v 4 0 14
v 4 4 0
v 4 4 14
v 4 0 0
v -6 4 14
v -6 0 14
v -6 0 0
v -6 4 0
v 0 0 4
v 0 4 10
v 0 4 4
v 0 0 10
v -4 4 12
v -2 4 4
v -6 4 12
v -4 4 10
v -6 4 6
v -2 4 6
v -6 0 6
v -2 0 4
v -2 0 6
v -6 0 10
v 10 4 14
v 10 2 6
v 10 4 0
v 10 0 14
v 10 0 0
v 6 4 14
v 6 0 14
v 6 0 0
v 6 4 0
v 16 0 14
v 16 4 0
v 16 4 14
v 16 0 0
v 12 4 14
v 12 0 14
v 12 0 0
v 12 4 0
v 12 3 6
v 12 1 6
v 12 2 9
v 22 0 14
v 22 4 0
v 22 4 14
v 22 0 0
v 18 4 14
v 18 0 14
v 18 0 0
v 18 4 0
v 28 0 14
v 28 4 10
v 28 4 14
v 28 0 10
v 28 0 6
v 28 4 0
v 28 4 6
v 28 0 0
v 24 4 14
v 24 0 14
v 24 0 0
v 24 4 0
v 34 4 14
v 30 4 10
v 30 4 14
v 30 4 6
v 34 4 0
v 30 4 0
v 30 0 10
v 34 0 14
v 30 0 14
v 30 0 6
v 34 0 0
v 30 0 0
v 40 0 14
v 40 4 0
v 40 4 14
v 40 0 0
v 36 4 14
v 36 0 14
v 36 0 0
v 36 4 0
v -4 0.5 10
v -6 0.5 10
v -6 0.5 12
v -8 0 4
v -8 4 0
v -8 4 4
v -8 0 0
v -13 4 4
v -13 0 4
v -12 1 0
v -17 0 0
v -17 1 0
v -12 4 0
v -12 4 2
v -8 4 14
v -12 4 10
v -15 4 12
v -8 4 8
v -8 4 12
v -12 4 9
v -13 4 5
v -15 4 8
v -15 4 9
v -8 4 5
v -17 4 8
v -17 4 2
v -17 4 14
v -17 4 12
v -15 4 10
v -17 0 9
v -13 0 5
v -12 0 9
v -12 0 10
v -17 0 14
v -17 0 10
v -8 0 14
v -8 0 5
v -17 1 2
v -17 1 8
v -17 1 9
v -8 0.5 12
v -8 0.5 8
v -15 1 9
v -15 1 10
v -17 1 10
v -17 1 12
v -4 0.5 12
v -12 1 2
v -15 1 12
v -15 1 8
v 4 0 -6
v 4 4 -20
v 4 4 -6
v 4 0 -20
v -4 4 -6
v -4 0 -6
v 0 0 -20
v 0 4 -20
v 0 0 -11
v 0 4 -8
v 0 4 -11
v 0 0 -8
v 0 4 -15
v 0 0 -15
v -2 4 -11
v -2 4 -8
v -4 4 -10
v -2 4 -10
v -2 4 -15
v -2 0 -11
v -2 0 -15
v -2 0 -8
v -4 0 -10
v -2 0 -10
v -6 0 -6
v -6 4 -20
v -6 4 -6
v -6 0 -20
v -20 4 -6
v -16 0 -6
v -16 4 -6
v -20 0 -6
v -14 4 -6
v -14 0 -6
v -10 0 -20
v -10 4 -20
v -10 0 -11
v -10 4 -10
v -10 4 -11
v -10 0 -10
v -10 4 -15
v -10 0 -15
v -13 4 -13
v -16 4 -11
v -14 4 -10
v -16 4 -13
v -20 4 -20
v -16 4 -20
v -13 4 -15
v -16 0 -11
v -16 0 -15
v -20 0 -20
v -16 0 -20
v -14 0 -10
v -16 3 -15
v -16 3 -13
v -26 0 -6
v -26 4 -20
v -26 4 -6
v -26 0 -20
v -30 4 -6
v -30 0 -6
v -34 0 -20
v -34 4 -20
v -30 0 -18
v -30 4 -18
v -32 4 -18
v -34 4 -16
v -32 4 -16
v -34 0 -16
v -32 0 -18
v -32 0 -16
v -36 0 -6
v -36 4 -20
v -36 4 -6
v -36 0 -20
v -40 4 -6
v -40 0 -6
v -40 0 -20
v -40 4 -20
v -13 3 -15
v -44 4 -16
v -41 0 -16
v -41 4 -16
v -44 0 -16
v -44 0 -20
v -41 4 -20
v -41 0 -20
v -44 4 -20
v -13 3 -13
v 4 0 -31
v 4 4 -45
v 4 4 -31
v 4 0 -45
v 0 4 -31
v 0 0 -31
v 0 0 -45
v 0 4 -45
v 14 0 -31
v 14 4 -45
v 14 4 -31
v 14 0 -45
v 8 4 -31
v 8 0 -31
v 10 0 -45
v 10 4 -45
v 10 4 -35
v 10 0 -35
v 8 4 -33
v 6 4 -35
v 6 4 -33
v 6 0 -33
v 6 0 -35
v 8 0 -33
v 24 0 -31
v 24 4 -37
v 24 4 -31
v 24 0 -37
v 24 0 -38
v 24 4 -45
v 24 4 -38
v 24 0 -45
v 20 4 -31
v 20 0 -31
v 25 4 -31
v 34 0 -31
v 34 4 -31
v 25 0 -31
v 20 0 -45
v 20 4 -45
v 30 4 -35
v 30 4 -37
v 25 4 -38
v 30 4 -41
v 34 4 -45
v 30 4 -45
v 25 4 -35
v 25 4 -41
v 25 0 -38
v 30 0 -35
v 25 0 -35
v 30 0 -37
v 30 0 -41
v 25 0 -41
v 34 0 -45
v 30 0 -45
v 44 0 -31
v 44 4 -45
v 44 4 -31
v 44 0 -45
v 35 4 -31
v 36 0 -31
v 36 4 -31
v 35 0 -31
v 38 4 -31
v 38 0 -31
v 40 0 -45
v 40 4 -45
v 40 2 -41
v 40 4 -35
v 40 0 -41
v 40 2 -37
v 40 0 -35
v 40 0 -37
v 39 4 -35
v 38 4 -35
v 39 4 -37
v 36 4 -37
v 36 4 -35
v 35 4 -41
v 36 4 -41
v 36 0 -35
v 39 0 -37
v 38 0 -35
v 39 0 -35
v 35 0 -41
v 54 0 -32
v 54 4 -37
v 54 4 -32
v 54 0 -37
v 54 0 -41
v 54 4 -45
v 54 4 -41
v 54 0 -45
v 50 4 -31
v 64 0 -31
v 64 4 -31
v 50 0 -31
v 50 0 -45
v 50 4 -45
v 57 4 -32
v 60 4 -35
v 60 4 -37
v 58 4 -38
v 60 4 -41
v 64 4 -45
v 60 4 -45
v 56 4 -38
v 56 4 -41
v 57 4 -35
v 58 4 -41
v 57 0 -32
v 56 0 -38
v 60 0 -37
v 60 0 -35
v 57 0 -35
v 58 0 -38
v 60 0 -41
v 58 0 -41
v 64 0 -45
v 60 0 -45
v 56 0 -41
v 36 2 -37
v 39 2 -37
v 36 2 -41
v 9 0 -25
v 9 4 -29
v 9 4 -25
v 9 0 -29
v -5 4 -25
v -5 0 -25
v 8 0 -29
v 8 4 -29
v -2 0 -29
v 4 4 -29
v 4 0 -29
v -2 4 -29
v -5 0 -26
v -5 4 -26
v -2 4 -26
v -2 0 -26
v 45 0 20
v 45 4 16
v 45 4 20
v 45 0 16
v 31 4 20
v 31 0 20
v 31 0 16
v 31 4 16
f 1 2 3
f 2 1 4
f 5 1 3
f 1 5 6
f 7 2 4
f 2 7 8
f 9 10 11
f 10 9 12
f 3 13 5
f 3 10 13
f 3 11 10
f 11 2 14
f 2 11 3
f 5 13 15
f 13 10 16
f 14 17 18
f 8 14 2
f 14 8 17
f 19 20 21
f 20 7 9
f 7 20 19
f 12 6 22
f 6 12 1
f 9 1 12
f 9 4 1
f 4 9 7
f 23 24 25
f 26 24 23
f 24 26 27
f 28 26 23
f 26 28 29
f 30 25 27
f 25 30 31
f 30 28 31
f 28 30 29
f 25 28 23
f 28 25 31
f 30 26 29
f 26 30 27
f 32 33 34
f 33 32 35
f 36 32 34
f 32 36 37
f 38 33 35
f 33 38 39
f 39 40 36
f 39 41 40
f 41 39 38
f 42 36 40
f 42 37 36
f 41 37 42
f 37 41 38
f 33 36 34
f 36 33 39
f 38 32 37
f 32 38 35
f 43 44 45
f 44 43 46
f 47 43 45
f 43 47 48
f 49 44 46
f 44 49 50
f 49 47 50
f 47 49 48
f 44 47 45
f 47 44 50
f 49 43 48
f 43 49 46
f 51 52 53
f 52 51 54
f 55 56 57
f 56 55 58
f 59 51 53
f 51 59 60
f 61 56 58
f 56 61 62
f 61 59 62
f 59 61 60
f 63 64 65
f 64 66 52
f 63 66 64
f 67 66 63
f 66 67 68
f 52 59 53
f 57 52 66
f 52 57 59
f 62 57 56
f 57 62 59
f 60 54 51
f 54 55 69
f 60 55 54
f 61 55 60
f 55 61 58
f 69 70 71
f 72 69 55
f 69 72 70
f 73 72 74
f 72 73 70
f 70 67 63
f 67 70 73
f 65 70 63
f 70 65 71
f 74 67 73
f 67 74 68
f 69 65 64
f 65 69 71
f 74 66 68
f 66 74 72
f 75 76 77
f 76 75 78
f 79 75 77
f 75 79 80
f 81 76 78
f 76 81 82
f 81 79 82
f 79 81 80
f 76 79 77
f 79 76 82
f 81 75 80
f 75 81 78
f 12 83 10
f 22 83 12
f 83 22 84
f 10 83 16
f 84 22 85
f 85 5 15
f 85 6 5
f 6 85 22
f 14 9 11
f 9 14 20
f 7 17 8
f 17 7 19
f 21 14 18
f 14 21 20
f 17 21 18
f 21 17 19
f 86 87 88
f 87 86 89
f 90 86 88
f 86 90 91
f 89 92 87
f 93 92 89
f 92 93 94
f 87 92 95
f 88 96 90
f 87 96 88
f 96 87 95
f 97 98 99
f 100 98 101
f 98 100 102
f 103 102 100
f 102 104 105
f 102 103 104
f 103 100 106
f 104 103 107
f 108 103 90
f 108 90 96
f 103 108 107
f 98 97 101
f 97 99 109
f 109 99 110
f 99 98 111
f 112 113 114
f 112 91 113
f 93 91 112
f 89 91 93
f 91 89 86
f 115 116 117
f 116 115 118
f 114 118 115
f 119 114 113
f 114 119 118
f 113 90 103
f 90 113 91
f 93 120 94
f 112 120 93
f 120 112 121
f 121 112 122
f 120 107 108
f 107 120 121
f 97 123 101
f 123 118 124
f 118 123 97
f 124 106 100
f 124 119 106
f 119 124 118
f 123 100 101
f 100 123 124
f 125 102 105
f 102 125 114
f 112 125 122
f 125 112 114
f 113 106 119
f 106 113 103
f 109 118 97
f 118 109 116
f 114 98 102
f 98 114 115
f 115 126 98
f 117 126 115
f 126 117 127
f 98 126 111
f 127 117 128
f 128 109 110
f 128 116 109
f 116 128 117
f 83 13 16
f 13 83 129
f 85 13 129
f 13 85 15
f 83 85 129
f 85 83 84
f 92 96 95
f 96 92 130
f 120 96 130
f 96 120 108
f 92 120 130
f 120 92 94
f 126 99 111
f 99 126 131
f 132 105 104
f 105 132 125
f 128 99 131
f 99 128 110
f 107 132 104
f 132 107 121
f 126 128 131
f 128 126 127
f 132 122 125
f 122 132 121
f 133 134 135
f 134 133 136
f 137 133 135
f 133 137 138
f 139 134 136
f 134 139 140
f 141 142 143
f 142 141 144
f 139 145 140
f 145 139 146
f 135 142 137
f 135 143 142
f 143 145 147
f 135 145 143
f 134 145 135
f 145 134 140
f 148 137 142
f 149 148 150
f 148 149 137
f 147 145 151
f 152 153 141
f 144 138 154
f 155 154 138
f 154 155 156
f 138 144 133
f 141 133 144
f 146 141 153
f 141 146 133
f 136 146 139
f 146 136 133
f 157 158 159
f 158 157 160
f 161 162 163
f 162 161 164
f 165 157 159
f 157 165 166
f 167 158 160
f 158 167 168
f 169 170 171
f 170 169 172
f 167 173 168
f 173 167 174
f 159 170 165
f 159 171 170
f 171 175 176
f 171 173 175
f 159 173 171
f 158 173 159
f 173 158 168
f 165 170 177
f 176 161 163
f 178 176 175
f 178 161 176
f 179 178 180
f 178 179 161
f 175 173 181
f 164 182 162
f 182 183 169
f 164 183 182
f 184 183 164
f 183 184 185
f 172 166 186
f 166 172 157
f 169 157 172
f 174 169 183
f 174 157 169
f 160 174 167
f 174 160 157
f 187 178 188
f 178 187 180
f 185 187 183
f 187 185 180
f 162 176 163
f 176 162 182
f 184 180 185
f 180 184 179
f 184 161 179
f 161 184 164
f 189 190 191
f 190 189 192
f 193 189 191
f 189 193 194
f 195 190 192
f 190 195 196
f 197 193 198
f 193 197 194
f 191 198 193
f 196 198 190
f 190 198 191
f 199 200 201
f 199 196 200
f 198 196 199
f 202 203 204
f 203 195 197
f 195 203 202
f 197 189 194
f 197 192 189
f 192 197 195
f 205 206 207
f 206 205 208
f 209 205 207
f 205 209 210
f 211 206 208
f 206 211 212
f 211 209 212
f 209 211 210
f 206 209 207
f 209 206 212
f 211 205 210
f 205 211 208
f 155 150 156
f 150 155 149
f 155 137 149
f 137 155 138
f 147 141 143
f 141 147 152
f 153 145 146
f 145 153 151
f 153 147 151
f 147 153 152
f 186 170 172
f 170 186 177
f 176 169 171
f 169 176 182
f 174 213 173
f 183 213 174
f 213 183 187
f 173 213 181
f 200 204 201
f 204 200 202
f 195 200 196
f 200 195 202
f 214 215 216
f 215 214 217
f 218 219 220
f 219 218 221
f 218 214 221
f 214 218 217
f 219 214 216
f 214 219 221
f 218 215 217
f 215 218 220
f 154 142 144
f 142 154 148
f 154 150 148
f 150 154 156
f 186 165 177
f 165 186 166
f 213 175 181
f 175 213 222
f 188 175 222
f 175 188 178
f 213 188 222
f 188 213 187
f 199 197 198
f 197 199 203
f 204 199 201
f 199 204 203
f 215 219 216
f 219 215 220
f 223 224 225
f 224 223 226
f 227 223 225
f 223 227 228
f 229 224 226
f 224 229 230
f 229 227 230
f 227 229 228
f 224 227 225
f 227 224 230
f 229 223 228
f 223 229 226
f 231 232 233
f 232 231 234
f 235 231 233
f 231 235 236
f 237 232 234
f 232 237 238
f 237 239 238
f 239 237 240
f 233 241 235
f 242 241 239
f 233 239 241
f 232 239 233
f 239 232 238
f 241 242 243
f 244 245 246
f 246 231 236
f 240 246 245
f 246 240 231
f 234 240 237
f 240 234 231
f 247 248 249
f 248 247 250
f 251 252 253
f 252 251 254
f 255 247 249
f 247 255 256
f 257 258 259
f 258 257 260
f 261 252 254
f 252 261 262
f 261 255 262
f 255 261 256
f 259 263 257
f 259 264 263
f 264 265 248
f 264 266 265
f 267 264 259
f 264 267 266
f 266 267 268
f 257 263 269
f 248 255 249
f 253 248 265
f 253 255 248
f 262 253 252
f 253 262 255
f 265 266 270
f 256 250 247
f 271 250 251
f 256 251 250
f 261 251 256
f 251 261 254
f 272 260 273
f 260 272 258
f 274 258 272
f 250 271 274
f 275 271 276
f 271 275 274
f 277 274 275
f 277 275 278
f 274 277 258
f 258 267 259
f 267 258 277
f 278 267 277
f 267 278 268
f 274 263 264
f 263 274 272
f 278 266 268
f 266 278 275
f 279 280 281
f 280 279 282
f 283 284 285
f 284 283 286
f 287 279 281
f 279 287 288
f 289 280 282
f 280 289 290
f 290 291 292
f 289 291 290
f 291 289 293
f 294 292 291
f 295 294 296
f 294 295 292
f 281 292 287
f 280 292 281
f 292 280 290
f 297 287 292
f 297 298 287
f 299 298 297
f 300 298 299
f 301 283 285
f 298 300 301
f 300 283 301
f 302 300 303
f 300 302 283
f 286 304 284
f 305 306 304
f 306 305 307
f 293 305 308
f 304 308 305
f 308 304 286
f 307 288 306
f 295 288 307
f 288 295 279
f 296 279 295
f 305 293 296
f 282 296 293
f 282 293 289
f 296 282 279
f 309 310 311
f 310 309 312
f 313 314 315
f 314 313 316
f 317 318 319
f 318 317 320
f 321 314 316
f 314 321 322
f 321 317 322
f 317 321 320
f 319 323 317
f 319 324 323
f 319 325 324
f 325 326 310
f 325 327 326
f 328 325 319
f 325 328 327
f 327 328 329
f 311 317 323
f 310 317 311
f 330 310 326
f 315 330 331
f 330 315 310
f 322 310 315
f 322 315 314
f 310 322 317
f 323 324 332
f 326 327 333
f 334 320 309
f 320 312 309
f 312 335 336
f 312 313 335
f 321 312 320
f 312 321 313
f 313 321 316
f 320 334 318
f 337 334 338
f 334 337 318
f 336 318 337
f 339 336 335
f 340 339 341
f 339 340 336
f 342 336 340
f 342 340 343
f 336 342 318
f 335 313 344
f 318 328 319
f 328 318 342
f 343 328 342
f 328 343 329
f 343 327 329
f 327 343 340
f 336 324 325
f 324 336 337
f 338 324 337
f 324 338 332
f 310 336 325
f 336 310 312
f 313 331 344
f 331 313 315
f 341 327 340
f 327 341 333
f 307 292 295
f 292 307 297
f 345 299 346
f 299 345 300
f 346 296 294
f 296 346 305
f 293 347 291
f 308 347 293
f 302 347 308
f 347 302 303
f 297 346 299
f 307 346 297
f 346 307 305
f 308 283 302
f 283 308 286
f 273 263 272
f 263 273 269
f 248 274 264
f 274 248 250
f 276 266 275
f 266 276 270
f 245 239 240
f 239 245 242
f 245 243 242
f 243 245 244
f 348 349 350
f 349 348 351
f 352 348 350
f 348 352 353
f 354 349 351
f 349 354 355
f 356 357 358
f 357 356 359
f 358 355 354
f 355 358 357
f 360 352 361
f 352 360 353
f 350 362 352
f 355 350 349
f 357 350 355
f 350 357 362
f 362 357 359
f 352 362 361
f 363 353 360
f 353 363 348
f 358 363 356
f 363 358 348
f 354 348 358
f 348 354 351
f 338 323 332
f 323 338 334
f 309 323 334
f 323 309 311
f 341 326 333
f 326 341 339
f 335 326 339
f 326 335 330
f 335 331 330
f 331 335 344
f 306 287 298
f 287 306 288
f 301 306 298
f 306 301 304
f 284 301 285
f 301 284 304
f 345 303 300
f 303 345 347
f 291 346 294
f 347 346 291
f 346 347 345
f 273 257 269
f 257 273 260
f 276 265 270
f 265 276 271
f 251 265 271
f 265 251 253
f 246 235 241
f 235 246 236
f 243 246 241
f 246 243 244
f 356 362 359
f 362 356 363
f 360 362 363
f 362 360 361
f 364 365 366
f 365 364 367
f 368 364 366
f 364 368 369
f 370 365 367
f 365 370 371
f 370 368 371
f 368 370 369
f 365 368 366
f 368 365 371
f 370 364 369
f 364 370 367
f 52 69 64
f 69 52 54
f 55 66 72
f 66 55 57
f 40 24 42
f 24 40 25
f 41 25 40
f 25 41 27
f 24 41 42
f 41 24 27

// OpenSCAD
//3D PRINT THIS AS STL

module things(num, space) {
  for (i = [0 : num-1])
    translate([space*i, 0, 0 ]) child(0);
}

things(7, 6) cube([4, 4, 14]);

translate([31, 0, 16]) cube([14, 4, 4]);
translate([24, 0, 6]) cube([6, 4, 4]);

polyhedron(
	points = [
		[10, 0, 0],
		[10, 4, 0],
		[6, 2, 0],
		[14, 2, 12]
	],
	triangles = [
		[0, 1, 2],
		[3, 1, 0],
		[3, 2, 1],
		[0, 2, 3]
	]
);

difference(){

union() {
translate([-6, 0, 10]) cube([6, 4, 4]);
translate([-6, 0, 0]) cube([6, 4, 4]);
translate([-6, 0, 0]) cube([4, 4, 6]);

translate([-14, 0, 0]) cube([6, 4, 4]);
translate([-17, 0, 0]) cube([4, 4, 8]);
translate([-17, 0, 5]) cube([9, 4, 4]);
translate([-12, 0, 5]) cube([4, 4, 9]);
translate([-17, 0, 10]) cube([6, 4, 4]);
}

union() {
translate([-6, 4, 10]) cube([4, 7, 4], center = true);

translate([-14, 4, 0]) cube([4, 6, 4], center = true);
translate([-17, 4, 0]) cube([4, 6, 4], center = true);
translate([-17, 4, 10]) cube([4, 6, 4], center = true);
}
}

module fall(num, space) {
  for (i = [0 : num-1])
    translate([space*i, 0, -20 ]) child(0);
}

fall(5, -10) cube([4, 4, 14]);

difference(){

union(){
translate([-4, 0, -10]) cube([4, 4, 4]);
translate([-2, 0, -15]) cube([2, 4, 4]);

translate([-18, 0, -10]) cube([8, 4, 4]);
translate([-18, 0, -15]) cube([8, 4, 4]);

translate([-34, 0, -20]) cube([4, 4, 4]);
translate([-44, 0, -20]) cube([4, 4, 4]);
}
union(){

translate([-2, 0, -10]) cube([4, 4, 2]);
translate([0, 2, -15]) cube([2, 4, 4]);

translate([-16, 0, -10]) cube([2, 4, 4]);
translate([-16, 3, -15]) cube([3, 4, 2]);

translate([-32, 0, -18]) cube([3, 4, 4]);
translate([-41, 0, -20]) cube([4, 4, 4]);

}
}

module apart(num, space) {
  for (i = [0 : num-1])
    translate([space*i, 0, -45 ]) child(0);
}

apart(7, 10) cube([4, 4, 14]);

difference(){

union(){
translate([54, 0, -35]) cube([10, 4, 4]);
translate([54, 0, -41]) cube([10, 4, 4]);

translate([36, 0, -35]) cube([6, 4, 4]);
translate([36, 0, -41]) cube([6, 4, 4]);
translate([35, 0, -41]) cube([4, 4, 10]);

translate([20, 0, -35]) cube([10, 4, 4]);
translate([20, 0, -41]) cube([10, 4, 4]);

translate([6, 0, -35]) cube([8, 4, 4]);

translate([-5, 0, -29]) cube([14, 4, 4]);
}

union()
translate([54, 0, -35]) cube([3, 4, 3]);
translate([56, 0, -41]) cube([2, 4, 3]);

translate([36, 0, -35]) cube([2, 4, 4]);
translate([36, 2, -41]) cube([4, 4, 4]);

translate([22, 0, -35]) cube([3, 5, 4]);
translate([21, 0, -42]) cube([4, 5, 4]);

translate([4, 0, -33]) cube([4, 4, 4]);

translate([-5, 0, -29]) cube([3, 4, 3]);

}
